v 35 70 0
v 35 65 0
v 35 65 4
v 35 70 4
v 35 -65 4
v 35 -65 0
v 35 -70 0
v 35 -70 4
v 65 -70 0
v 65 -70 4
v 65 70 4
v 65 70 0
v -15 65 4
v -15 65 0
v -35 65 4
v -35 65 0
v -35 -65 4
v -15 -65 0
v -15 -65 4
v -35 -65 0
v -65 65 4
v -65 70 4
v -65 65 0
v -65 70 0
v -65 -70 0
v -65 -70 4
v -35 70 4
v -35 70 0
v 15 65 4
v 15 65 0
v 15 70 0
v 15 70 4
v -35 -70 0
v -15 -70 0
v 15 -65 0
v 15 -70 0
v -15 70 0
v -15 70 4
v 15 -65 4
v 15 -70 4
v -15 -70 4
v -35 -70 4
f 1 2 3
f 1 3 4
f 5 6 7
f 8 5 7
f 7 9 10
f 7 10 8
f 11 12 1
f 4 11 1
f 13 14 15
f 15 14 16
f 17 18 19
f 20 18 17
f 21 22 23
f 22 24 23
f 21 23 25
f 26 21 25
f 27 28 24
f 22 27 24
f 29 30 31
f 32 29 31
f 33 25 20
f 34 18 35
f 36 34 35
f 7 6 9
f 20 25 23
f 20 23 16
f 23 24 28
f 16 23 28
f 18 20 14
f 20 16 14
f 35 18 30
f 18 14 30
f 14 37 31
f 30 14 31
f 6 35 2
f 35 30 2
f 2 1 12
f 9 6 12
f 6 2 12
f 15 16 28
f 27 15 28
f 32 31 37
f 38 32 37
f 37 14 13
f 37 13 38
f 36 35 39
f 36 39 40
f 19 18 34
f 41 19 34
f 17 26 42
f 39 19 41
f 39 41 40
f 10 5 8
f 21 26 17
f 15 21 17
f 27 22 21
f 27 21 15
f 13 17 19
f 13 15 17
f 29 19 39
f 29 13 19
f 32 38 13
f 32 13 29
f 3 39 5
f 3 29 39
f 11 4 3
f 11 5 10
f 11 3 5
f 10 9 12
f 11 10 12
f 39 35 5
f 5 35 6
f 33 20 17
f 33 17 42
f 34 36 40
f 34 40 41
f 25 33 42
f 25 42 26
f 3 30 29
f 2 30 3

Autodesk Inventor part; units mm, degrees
ref_plane "YZ Plane" through (0, 0, 0) normal (1, 0, 0) x (0, 1, 0)
ref_plane "XZ Plane" through (0, 0, 0) normal (0, 1, 0) x (-1, 0, 0)
ref_plane "XY Plane" through (0, 0, 0) normal (0, 0, 1) x (1, 0, 0)
sketch "Sketch1" plane through (0, 0, 0) normal (0, 0, 1) x (1, 0, 0)
  line L0 (65, -70) -> (65, 70)
  line L1 (-65, 70) -> (-65, -70)
  line L2 (-65, 70) -> (-65, 65)
  line L3 (-15, 65) -> (-15, 70)
  line L4 (-15, 65) -> (-35, 65)
  line L5 (-35, 65) -> (-35, 70)
  line L6 (15, 65) -> (15, 70)
  line L7 (35, 65) -> (35, 70)
  line L8 (-35, 70) -> (-65, 70)
  line L9 (65, 70) -> (35, 70)
  line L10 (15, 70) -> (-15, 70)
  line L11 (-15, -65) -> (-15, -70)
  line L12 (-15, -65) -> (-35, -65)
  line L13 (-35, -65) -> (-35, -70)
  line L14 (35, -65) -> (35, -70)
  line L15 (15, -65) -> (15, -70)
  line L16 (-35, -70) -> (-65, -70)
  line L17 (65, -70) -> (35, -70)
  line L18 (15, -70) -> (-15, -70)
  line L19 (-65, -70) -> (-35, -70)
  line L20 (35, -70) -> (65, -70)
  line L21 (-35, -65) -> (-15, -65)
  line L22 (15, -65) -> (35, -65)
  line L23 (-35, 65) -> (-15, 65)
  line L24 (15, 65) -> (35, 65)
  point P0 (0, 0)
extrude "Extrusion1" add sketch "Sketch1" along normal blind 4
sketch "Sketch2" plane through (-15, 70, 0) normal (0, 1, 0) x (1, 0, 0)
  line L0 (-20, 0) -> (-50, 0) projected
  line L1 (-50, 0) -> (-50, -4) projected
  line L2 (-20, -4) -> (-50, -4) projected
  line L3 (-20, 0) -> (-20, -4) projected
  line L4 (0, 0) -> (-20, 0) projected
  line L5 (-20, 0) -> (-20, -4) projected
  line L6 (0, -4) -> (-20, -4) projected
  line L7 (0, 0) -> (0, -4) projected
  line L8 (30, 0) -> (0, 0) projected
  line L9 (0, 0) -> (0, -4) projected
  line L10 (30, -4) -> (0, -4) projected
  line L11 (30, 0) -> (30, -4) projected
  line L12 (50, 0) -> (30, 0) projected
  line L13 (50, -4) -> (30, -4) projected
  line L14 (50, 0) -> (30, 0) projected
  line L15 (30, 0) -> (30, -4) projected
  line L16 (50, -4) -> (30, -4) projected
  line L17 (50, 0) -> (50, -4) projected
  line L18 (80, 0) -> (50, 0) projected
  line L19 (50, 0) -> (50, -4) projected
  line L20 (80, -4) -> (50, -4) projected
  line L21 (80, 0) -> (80, -4) projected
  point P0 (15, 0)
properties part number "torso_base"
